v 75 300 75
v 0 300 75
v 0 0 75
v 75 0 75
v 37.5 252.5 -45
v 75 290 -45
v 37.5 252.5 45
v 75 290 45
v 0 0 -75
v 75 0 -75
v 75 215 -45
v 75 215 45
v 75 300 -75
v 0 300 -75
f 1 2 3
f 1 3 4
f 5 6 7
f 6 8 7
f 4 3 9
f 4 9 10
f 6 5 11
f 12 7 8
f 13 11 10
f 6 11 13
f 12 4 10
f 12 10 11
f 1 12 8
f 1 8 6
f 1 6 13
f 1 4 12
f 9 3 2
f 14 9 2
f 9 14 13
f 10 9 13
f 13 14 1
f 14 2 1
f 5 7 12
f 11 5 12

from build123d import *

# Parameters (mm, degrees)
SKETCH1_W           = 75
SKETCH1_H           = 300
BOSS_EXTRUDE1_DEPTH = 75
CUT_EXTRUDE1_START  = -75
CUT_EXTRUDE1_DEPTH  = 45


with BuildPart() as part:
    # Sketch1 → Boss-Extrude1 (new, symmetric)
    with BuildSketch(Plane.XY):
        with Locations((37.5, 150)):
            Rectangle(SKETCH1_W, SKETCH1_H)
    extrude(amount=BOSS_EXTRUDE1_DEPTH, both=True)

    # Sketch2 → Cut-Extrude1 (cut, symmetric)
    with BuildSketch(Plane.XY.offset(75).offset(CUT_EXTRUDE1_START)):
        Polygon((75, 290), (37.5, 252.5), (75, 215), align=None)
    extrude(amount=CUT_EXTRUDE1_DEPTH, both=True, mode=Mode.SUBTRACT)


solid = part.part
